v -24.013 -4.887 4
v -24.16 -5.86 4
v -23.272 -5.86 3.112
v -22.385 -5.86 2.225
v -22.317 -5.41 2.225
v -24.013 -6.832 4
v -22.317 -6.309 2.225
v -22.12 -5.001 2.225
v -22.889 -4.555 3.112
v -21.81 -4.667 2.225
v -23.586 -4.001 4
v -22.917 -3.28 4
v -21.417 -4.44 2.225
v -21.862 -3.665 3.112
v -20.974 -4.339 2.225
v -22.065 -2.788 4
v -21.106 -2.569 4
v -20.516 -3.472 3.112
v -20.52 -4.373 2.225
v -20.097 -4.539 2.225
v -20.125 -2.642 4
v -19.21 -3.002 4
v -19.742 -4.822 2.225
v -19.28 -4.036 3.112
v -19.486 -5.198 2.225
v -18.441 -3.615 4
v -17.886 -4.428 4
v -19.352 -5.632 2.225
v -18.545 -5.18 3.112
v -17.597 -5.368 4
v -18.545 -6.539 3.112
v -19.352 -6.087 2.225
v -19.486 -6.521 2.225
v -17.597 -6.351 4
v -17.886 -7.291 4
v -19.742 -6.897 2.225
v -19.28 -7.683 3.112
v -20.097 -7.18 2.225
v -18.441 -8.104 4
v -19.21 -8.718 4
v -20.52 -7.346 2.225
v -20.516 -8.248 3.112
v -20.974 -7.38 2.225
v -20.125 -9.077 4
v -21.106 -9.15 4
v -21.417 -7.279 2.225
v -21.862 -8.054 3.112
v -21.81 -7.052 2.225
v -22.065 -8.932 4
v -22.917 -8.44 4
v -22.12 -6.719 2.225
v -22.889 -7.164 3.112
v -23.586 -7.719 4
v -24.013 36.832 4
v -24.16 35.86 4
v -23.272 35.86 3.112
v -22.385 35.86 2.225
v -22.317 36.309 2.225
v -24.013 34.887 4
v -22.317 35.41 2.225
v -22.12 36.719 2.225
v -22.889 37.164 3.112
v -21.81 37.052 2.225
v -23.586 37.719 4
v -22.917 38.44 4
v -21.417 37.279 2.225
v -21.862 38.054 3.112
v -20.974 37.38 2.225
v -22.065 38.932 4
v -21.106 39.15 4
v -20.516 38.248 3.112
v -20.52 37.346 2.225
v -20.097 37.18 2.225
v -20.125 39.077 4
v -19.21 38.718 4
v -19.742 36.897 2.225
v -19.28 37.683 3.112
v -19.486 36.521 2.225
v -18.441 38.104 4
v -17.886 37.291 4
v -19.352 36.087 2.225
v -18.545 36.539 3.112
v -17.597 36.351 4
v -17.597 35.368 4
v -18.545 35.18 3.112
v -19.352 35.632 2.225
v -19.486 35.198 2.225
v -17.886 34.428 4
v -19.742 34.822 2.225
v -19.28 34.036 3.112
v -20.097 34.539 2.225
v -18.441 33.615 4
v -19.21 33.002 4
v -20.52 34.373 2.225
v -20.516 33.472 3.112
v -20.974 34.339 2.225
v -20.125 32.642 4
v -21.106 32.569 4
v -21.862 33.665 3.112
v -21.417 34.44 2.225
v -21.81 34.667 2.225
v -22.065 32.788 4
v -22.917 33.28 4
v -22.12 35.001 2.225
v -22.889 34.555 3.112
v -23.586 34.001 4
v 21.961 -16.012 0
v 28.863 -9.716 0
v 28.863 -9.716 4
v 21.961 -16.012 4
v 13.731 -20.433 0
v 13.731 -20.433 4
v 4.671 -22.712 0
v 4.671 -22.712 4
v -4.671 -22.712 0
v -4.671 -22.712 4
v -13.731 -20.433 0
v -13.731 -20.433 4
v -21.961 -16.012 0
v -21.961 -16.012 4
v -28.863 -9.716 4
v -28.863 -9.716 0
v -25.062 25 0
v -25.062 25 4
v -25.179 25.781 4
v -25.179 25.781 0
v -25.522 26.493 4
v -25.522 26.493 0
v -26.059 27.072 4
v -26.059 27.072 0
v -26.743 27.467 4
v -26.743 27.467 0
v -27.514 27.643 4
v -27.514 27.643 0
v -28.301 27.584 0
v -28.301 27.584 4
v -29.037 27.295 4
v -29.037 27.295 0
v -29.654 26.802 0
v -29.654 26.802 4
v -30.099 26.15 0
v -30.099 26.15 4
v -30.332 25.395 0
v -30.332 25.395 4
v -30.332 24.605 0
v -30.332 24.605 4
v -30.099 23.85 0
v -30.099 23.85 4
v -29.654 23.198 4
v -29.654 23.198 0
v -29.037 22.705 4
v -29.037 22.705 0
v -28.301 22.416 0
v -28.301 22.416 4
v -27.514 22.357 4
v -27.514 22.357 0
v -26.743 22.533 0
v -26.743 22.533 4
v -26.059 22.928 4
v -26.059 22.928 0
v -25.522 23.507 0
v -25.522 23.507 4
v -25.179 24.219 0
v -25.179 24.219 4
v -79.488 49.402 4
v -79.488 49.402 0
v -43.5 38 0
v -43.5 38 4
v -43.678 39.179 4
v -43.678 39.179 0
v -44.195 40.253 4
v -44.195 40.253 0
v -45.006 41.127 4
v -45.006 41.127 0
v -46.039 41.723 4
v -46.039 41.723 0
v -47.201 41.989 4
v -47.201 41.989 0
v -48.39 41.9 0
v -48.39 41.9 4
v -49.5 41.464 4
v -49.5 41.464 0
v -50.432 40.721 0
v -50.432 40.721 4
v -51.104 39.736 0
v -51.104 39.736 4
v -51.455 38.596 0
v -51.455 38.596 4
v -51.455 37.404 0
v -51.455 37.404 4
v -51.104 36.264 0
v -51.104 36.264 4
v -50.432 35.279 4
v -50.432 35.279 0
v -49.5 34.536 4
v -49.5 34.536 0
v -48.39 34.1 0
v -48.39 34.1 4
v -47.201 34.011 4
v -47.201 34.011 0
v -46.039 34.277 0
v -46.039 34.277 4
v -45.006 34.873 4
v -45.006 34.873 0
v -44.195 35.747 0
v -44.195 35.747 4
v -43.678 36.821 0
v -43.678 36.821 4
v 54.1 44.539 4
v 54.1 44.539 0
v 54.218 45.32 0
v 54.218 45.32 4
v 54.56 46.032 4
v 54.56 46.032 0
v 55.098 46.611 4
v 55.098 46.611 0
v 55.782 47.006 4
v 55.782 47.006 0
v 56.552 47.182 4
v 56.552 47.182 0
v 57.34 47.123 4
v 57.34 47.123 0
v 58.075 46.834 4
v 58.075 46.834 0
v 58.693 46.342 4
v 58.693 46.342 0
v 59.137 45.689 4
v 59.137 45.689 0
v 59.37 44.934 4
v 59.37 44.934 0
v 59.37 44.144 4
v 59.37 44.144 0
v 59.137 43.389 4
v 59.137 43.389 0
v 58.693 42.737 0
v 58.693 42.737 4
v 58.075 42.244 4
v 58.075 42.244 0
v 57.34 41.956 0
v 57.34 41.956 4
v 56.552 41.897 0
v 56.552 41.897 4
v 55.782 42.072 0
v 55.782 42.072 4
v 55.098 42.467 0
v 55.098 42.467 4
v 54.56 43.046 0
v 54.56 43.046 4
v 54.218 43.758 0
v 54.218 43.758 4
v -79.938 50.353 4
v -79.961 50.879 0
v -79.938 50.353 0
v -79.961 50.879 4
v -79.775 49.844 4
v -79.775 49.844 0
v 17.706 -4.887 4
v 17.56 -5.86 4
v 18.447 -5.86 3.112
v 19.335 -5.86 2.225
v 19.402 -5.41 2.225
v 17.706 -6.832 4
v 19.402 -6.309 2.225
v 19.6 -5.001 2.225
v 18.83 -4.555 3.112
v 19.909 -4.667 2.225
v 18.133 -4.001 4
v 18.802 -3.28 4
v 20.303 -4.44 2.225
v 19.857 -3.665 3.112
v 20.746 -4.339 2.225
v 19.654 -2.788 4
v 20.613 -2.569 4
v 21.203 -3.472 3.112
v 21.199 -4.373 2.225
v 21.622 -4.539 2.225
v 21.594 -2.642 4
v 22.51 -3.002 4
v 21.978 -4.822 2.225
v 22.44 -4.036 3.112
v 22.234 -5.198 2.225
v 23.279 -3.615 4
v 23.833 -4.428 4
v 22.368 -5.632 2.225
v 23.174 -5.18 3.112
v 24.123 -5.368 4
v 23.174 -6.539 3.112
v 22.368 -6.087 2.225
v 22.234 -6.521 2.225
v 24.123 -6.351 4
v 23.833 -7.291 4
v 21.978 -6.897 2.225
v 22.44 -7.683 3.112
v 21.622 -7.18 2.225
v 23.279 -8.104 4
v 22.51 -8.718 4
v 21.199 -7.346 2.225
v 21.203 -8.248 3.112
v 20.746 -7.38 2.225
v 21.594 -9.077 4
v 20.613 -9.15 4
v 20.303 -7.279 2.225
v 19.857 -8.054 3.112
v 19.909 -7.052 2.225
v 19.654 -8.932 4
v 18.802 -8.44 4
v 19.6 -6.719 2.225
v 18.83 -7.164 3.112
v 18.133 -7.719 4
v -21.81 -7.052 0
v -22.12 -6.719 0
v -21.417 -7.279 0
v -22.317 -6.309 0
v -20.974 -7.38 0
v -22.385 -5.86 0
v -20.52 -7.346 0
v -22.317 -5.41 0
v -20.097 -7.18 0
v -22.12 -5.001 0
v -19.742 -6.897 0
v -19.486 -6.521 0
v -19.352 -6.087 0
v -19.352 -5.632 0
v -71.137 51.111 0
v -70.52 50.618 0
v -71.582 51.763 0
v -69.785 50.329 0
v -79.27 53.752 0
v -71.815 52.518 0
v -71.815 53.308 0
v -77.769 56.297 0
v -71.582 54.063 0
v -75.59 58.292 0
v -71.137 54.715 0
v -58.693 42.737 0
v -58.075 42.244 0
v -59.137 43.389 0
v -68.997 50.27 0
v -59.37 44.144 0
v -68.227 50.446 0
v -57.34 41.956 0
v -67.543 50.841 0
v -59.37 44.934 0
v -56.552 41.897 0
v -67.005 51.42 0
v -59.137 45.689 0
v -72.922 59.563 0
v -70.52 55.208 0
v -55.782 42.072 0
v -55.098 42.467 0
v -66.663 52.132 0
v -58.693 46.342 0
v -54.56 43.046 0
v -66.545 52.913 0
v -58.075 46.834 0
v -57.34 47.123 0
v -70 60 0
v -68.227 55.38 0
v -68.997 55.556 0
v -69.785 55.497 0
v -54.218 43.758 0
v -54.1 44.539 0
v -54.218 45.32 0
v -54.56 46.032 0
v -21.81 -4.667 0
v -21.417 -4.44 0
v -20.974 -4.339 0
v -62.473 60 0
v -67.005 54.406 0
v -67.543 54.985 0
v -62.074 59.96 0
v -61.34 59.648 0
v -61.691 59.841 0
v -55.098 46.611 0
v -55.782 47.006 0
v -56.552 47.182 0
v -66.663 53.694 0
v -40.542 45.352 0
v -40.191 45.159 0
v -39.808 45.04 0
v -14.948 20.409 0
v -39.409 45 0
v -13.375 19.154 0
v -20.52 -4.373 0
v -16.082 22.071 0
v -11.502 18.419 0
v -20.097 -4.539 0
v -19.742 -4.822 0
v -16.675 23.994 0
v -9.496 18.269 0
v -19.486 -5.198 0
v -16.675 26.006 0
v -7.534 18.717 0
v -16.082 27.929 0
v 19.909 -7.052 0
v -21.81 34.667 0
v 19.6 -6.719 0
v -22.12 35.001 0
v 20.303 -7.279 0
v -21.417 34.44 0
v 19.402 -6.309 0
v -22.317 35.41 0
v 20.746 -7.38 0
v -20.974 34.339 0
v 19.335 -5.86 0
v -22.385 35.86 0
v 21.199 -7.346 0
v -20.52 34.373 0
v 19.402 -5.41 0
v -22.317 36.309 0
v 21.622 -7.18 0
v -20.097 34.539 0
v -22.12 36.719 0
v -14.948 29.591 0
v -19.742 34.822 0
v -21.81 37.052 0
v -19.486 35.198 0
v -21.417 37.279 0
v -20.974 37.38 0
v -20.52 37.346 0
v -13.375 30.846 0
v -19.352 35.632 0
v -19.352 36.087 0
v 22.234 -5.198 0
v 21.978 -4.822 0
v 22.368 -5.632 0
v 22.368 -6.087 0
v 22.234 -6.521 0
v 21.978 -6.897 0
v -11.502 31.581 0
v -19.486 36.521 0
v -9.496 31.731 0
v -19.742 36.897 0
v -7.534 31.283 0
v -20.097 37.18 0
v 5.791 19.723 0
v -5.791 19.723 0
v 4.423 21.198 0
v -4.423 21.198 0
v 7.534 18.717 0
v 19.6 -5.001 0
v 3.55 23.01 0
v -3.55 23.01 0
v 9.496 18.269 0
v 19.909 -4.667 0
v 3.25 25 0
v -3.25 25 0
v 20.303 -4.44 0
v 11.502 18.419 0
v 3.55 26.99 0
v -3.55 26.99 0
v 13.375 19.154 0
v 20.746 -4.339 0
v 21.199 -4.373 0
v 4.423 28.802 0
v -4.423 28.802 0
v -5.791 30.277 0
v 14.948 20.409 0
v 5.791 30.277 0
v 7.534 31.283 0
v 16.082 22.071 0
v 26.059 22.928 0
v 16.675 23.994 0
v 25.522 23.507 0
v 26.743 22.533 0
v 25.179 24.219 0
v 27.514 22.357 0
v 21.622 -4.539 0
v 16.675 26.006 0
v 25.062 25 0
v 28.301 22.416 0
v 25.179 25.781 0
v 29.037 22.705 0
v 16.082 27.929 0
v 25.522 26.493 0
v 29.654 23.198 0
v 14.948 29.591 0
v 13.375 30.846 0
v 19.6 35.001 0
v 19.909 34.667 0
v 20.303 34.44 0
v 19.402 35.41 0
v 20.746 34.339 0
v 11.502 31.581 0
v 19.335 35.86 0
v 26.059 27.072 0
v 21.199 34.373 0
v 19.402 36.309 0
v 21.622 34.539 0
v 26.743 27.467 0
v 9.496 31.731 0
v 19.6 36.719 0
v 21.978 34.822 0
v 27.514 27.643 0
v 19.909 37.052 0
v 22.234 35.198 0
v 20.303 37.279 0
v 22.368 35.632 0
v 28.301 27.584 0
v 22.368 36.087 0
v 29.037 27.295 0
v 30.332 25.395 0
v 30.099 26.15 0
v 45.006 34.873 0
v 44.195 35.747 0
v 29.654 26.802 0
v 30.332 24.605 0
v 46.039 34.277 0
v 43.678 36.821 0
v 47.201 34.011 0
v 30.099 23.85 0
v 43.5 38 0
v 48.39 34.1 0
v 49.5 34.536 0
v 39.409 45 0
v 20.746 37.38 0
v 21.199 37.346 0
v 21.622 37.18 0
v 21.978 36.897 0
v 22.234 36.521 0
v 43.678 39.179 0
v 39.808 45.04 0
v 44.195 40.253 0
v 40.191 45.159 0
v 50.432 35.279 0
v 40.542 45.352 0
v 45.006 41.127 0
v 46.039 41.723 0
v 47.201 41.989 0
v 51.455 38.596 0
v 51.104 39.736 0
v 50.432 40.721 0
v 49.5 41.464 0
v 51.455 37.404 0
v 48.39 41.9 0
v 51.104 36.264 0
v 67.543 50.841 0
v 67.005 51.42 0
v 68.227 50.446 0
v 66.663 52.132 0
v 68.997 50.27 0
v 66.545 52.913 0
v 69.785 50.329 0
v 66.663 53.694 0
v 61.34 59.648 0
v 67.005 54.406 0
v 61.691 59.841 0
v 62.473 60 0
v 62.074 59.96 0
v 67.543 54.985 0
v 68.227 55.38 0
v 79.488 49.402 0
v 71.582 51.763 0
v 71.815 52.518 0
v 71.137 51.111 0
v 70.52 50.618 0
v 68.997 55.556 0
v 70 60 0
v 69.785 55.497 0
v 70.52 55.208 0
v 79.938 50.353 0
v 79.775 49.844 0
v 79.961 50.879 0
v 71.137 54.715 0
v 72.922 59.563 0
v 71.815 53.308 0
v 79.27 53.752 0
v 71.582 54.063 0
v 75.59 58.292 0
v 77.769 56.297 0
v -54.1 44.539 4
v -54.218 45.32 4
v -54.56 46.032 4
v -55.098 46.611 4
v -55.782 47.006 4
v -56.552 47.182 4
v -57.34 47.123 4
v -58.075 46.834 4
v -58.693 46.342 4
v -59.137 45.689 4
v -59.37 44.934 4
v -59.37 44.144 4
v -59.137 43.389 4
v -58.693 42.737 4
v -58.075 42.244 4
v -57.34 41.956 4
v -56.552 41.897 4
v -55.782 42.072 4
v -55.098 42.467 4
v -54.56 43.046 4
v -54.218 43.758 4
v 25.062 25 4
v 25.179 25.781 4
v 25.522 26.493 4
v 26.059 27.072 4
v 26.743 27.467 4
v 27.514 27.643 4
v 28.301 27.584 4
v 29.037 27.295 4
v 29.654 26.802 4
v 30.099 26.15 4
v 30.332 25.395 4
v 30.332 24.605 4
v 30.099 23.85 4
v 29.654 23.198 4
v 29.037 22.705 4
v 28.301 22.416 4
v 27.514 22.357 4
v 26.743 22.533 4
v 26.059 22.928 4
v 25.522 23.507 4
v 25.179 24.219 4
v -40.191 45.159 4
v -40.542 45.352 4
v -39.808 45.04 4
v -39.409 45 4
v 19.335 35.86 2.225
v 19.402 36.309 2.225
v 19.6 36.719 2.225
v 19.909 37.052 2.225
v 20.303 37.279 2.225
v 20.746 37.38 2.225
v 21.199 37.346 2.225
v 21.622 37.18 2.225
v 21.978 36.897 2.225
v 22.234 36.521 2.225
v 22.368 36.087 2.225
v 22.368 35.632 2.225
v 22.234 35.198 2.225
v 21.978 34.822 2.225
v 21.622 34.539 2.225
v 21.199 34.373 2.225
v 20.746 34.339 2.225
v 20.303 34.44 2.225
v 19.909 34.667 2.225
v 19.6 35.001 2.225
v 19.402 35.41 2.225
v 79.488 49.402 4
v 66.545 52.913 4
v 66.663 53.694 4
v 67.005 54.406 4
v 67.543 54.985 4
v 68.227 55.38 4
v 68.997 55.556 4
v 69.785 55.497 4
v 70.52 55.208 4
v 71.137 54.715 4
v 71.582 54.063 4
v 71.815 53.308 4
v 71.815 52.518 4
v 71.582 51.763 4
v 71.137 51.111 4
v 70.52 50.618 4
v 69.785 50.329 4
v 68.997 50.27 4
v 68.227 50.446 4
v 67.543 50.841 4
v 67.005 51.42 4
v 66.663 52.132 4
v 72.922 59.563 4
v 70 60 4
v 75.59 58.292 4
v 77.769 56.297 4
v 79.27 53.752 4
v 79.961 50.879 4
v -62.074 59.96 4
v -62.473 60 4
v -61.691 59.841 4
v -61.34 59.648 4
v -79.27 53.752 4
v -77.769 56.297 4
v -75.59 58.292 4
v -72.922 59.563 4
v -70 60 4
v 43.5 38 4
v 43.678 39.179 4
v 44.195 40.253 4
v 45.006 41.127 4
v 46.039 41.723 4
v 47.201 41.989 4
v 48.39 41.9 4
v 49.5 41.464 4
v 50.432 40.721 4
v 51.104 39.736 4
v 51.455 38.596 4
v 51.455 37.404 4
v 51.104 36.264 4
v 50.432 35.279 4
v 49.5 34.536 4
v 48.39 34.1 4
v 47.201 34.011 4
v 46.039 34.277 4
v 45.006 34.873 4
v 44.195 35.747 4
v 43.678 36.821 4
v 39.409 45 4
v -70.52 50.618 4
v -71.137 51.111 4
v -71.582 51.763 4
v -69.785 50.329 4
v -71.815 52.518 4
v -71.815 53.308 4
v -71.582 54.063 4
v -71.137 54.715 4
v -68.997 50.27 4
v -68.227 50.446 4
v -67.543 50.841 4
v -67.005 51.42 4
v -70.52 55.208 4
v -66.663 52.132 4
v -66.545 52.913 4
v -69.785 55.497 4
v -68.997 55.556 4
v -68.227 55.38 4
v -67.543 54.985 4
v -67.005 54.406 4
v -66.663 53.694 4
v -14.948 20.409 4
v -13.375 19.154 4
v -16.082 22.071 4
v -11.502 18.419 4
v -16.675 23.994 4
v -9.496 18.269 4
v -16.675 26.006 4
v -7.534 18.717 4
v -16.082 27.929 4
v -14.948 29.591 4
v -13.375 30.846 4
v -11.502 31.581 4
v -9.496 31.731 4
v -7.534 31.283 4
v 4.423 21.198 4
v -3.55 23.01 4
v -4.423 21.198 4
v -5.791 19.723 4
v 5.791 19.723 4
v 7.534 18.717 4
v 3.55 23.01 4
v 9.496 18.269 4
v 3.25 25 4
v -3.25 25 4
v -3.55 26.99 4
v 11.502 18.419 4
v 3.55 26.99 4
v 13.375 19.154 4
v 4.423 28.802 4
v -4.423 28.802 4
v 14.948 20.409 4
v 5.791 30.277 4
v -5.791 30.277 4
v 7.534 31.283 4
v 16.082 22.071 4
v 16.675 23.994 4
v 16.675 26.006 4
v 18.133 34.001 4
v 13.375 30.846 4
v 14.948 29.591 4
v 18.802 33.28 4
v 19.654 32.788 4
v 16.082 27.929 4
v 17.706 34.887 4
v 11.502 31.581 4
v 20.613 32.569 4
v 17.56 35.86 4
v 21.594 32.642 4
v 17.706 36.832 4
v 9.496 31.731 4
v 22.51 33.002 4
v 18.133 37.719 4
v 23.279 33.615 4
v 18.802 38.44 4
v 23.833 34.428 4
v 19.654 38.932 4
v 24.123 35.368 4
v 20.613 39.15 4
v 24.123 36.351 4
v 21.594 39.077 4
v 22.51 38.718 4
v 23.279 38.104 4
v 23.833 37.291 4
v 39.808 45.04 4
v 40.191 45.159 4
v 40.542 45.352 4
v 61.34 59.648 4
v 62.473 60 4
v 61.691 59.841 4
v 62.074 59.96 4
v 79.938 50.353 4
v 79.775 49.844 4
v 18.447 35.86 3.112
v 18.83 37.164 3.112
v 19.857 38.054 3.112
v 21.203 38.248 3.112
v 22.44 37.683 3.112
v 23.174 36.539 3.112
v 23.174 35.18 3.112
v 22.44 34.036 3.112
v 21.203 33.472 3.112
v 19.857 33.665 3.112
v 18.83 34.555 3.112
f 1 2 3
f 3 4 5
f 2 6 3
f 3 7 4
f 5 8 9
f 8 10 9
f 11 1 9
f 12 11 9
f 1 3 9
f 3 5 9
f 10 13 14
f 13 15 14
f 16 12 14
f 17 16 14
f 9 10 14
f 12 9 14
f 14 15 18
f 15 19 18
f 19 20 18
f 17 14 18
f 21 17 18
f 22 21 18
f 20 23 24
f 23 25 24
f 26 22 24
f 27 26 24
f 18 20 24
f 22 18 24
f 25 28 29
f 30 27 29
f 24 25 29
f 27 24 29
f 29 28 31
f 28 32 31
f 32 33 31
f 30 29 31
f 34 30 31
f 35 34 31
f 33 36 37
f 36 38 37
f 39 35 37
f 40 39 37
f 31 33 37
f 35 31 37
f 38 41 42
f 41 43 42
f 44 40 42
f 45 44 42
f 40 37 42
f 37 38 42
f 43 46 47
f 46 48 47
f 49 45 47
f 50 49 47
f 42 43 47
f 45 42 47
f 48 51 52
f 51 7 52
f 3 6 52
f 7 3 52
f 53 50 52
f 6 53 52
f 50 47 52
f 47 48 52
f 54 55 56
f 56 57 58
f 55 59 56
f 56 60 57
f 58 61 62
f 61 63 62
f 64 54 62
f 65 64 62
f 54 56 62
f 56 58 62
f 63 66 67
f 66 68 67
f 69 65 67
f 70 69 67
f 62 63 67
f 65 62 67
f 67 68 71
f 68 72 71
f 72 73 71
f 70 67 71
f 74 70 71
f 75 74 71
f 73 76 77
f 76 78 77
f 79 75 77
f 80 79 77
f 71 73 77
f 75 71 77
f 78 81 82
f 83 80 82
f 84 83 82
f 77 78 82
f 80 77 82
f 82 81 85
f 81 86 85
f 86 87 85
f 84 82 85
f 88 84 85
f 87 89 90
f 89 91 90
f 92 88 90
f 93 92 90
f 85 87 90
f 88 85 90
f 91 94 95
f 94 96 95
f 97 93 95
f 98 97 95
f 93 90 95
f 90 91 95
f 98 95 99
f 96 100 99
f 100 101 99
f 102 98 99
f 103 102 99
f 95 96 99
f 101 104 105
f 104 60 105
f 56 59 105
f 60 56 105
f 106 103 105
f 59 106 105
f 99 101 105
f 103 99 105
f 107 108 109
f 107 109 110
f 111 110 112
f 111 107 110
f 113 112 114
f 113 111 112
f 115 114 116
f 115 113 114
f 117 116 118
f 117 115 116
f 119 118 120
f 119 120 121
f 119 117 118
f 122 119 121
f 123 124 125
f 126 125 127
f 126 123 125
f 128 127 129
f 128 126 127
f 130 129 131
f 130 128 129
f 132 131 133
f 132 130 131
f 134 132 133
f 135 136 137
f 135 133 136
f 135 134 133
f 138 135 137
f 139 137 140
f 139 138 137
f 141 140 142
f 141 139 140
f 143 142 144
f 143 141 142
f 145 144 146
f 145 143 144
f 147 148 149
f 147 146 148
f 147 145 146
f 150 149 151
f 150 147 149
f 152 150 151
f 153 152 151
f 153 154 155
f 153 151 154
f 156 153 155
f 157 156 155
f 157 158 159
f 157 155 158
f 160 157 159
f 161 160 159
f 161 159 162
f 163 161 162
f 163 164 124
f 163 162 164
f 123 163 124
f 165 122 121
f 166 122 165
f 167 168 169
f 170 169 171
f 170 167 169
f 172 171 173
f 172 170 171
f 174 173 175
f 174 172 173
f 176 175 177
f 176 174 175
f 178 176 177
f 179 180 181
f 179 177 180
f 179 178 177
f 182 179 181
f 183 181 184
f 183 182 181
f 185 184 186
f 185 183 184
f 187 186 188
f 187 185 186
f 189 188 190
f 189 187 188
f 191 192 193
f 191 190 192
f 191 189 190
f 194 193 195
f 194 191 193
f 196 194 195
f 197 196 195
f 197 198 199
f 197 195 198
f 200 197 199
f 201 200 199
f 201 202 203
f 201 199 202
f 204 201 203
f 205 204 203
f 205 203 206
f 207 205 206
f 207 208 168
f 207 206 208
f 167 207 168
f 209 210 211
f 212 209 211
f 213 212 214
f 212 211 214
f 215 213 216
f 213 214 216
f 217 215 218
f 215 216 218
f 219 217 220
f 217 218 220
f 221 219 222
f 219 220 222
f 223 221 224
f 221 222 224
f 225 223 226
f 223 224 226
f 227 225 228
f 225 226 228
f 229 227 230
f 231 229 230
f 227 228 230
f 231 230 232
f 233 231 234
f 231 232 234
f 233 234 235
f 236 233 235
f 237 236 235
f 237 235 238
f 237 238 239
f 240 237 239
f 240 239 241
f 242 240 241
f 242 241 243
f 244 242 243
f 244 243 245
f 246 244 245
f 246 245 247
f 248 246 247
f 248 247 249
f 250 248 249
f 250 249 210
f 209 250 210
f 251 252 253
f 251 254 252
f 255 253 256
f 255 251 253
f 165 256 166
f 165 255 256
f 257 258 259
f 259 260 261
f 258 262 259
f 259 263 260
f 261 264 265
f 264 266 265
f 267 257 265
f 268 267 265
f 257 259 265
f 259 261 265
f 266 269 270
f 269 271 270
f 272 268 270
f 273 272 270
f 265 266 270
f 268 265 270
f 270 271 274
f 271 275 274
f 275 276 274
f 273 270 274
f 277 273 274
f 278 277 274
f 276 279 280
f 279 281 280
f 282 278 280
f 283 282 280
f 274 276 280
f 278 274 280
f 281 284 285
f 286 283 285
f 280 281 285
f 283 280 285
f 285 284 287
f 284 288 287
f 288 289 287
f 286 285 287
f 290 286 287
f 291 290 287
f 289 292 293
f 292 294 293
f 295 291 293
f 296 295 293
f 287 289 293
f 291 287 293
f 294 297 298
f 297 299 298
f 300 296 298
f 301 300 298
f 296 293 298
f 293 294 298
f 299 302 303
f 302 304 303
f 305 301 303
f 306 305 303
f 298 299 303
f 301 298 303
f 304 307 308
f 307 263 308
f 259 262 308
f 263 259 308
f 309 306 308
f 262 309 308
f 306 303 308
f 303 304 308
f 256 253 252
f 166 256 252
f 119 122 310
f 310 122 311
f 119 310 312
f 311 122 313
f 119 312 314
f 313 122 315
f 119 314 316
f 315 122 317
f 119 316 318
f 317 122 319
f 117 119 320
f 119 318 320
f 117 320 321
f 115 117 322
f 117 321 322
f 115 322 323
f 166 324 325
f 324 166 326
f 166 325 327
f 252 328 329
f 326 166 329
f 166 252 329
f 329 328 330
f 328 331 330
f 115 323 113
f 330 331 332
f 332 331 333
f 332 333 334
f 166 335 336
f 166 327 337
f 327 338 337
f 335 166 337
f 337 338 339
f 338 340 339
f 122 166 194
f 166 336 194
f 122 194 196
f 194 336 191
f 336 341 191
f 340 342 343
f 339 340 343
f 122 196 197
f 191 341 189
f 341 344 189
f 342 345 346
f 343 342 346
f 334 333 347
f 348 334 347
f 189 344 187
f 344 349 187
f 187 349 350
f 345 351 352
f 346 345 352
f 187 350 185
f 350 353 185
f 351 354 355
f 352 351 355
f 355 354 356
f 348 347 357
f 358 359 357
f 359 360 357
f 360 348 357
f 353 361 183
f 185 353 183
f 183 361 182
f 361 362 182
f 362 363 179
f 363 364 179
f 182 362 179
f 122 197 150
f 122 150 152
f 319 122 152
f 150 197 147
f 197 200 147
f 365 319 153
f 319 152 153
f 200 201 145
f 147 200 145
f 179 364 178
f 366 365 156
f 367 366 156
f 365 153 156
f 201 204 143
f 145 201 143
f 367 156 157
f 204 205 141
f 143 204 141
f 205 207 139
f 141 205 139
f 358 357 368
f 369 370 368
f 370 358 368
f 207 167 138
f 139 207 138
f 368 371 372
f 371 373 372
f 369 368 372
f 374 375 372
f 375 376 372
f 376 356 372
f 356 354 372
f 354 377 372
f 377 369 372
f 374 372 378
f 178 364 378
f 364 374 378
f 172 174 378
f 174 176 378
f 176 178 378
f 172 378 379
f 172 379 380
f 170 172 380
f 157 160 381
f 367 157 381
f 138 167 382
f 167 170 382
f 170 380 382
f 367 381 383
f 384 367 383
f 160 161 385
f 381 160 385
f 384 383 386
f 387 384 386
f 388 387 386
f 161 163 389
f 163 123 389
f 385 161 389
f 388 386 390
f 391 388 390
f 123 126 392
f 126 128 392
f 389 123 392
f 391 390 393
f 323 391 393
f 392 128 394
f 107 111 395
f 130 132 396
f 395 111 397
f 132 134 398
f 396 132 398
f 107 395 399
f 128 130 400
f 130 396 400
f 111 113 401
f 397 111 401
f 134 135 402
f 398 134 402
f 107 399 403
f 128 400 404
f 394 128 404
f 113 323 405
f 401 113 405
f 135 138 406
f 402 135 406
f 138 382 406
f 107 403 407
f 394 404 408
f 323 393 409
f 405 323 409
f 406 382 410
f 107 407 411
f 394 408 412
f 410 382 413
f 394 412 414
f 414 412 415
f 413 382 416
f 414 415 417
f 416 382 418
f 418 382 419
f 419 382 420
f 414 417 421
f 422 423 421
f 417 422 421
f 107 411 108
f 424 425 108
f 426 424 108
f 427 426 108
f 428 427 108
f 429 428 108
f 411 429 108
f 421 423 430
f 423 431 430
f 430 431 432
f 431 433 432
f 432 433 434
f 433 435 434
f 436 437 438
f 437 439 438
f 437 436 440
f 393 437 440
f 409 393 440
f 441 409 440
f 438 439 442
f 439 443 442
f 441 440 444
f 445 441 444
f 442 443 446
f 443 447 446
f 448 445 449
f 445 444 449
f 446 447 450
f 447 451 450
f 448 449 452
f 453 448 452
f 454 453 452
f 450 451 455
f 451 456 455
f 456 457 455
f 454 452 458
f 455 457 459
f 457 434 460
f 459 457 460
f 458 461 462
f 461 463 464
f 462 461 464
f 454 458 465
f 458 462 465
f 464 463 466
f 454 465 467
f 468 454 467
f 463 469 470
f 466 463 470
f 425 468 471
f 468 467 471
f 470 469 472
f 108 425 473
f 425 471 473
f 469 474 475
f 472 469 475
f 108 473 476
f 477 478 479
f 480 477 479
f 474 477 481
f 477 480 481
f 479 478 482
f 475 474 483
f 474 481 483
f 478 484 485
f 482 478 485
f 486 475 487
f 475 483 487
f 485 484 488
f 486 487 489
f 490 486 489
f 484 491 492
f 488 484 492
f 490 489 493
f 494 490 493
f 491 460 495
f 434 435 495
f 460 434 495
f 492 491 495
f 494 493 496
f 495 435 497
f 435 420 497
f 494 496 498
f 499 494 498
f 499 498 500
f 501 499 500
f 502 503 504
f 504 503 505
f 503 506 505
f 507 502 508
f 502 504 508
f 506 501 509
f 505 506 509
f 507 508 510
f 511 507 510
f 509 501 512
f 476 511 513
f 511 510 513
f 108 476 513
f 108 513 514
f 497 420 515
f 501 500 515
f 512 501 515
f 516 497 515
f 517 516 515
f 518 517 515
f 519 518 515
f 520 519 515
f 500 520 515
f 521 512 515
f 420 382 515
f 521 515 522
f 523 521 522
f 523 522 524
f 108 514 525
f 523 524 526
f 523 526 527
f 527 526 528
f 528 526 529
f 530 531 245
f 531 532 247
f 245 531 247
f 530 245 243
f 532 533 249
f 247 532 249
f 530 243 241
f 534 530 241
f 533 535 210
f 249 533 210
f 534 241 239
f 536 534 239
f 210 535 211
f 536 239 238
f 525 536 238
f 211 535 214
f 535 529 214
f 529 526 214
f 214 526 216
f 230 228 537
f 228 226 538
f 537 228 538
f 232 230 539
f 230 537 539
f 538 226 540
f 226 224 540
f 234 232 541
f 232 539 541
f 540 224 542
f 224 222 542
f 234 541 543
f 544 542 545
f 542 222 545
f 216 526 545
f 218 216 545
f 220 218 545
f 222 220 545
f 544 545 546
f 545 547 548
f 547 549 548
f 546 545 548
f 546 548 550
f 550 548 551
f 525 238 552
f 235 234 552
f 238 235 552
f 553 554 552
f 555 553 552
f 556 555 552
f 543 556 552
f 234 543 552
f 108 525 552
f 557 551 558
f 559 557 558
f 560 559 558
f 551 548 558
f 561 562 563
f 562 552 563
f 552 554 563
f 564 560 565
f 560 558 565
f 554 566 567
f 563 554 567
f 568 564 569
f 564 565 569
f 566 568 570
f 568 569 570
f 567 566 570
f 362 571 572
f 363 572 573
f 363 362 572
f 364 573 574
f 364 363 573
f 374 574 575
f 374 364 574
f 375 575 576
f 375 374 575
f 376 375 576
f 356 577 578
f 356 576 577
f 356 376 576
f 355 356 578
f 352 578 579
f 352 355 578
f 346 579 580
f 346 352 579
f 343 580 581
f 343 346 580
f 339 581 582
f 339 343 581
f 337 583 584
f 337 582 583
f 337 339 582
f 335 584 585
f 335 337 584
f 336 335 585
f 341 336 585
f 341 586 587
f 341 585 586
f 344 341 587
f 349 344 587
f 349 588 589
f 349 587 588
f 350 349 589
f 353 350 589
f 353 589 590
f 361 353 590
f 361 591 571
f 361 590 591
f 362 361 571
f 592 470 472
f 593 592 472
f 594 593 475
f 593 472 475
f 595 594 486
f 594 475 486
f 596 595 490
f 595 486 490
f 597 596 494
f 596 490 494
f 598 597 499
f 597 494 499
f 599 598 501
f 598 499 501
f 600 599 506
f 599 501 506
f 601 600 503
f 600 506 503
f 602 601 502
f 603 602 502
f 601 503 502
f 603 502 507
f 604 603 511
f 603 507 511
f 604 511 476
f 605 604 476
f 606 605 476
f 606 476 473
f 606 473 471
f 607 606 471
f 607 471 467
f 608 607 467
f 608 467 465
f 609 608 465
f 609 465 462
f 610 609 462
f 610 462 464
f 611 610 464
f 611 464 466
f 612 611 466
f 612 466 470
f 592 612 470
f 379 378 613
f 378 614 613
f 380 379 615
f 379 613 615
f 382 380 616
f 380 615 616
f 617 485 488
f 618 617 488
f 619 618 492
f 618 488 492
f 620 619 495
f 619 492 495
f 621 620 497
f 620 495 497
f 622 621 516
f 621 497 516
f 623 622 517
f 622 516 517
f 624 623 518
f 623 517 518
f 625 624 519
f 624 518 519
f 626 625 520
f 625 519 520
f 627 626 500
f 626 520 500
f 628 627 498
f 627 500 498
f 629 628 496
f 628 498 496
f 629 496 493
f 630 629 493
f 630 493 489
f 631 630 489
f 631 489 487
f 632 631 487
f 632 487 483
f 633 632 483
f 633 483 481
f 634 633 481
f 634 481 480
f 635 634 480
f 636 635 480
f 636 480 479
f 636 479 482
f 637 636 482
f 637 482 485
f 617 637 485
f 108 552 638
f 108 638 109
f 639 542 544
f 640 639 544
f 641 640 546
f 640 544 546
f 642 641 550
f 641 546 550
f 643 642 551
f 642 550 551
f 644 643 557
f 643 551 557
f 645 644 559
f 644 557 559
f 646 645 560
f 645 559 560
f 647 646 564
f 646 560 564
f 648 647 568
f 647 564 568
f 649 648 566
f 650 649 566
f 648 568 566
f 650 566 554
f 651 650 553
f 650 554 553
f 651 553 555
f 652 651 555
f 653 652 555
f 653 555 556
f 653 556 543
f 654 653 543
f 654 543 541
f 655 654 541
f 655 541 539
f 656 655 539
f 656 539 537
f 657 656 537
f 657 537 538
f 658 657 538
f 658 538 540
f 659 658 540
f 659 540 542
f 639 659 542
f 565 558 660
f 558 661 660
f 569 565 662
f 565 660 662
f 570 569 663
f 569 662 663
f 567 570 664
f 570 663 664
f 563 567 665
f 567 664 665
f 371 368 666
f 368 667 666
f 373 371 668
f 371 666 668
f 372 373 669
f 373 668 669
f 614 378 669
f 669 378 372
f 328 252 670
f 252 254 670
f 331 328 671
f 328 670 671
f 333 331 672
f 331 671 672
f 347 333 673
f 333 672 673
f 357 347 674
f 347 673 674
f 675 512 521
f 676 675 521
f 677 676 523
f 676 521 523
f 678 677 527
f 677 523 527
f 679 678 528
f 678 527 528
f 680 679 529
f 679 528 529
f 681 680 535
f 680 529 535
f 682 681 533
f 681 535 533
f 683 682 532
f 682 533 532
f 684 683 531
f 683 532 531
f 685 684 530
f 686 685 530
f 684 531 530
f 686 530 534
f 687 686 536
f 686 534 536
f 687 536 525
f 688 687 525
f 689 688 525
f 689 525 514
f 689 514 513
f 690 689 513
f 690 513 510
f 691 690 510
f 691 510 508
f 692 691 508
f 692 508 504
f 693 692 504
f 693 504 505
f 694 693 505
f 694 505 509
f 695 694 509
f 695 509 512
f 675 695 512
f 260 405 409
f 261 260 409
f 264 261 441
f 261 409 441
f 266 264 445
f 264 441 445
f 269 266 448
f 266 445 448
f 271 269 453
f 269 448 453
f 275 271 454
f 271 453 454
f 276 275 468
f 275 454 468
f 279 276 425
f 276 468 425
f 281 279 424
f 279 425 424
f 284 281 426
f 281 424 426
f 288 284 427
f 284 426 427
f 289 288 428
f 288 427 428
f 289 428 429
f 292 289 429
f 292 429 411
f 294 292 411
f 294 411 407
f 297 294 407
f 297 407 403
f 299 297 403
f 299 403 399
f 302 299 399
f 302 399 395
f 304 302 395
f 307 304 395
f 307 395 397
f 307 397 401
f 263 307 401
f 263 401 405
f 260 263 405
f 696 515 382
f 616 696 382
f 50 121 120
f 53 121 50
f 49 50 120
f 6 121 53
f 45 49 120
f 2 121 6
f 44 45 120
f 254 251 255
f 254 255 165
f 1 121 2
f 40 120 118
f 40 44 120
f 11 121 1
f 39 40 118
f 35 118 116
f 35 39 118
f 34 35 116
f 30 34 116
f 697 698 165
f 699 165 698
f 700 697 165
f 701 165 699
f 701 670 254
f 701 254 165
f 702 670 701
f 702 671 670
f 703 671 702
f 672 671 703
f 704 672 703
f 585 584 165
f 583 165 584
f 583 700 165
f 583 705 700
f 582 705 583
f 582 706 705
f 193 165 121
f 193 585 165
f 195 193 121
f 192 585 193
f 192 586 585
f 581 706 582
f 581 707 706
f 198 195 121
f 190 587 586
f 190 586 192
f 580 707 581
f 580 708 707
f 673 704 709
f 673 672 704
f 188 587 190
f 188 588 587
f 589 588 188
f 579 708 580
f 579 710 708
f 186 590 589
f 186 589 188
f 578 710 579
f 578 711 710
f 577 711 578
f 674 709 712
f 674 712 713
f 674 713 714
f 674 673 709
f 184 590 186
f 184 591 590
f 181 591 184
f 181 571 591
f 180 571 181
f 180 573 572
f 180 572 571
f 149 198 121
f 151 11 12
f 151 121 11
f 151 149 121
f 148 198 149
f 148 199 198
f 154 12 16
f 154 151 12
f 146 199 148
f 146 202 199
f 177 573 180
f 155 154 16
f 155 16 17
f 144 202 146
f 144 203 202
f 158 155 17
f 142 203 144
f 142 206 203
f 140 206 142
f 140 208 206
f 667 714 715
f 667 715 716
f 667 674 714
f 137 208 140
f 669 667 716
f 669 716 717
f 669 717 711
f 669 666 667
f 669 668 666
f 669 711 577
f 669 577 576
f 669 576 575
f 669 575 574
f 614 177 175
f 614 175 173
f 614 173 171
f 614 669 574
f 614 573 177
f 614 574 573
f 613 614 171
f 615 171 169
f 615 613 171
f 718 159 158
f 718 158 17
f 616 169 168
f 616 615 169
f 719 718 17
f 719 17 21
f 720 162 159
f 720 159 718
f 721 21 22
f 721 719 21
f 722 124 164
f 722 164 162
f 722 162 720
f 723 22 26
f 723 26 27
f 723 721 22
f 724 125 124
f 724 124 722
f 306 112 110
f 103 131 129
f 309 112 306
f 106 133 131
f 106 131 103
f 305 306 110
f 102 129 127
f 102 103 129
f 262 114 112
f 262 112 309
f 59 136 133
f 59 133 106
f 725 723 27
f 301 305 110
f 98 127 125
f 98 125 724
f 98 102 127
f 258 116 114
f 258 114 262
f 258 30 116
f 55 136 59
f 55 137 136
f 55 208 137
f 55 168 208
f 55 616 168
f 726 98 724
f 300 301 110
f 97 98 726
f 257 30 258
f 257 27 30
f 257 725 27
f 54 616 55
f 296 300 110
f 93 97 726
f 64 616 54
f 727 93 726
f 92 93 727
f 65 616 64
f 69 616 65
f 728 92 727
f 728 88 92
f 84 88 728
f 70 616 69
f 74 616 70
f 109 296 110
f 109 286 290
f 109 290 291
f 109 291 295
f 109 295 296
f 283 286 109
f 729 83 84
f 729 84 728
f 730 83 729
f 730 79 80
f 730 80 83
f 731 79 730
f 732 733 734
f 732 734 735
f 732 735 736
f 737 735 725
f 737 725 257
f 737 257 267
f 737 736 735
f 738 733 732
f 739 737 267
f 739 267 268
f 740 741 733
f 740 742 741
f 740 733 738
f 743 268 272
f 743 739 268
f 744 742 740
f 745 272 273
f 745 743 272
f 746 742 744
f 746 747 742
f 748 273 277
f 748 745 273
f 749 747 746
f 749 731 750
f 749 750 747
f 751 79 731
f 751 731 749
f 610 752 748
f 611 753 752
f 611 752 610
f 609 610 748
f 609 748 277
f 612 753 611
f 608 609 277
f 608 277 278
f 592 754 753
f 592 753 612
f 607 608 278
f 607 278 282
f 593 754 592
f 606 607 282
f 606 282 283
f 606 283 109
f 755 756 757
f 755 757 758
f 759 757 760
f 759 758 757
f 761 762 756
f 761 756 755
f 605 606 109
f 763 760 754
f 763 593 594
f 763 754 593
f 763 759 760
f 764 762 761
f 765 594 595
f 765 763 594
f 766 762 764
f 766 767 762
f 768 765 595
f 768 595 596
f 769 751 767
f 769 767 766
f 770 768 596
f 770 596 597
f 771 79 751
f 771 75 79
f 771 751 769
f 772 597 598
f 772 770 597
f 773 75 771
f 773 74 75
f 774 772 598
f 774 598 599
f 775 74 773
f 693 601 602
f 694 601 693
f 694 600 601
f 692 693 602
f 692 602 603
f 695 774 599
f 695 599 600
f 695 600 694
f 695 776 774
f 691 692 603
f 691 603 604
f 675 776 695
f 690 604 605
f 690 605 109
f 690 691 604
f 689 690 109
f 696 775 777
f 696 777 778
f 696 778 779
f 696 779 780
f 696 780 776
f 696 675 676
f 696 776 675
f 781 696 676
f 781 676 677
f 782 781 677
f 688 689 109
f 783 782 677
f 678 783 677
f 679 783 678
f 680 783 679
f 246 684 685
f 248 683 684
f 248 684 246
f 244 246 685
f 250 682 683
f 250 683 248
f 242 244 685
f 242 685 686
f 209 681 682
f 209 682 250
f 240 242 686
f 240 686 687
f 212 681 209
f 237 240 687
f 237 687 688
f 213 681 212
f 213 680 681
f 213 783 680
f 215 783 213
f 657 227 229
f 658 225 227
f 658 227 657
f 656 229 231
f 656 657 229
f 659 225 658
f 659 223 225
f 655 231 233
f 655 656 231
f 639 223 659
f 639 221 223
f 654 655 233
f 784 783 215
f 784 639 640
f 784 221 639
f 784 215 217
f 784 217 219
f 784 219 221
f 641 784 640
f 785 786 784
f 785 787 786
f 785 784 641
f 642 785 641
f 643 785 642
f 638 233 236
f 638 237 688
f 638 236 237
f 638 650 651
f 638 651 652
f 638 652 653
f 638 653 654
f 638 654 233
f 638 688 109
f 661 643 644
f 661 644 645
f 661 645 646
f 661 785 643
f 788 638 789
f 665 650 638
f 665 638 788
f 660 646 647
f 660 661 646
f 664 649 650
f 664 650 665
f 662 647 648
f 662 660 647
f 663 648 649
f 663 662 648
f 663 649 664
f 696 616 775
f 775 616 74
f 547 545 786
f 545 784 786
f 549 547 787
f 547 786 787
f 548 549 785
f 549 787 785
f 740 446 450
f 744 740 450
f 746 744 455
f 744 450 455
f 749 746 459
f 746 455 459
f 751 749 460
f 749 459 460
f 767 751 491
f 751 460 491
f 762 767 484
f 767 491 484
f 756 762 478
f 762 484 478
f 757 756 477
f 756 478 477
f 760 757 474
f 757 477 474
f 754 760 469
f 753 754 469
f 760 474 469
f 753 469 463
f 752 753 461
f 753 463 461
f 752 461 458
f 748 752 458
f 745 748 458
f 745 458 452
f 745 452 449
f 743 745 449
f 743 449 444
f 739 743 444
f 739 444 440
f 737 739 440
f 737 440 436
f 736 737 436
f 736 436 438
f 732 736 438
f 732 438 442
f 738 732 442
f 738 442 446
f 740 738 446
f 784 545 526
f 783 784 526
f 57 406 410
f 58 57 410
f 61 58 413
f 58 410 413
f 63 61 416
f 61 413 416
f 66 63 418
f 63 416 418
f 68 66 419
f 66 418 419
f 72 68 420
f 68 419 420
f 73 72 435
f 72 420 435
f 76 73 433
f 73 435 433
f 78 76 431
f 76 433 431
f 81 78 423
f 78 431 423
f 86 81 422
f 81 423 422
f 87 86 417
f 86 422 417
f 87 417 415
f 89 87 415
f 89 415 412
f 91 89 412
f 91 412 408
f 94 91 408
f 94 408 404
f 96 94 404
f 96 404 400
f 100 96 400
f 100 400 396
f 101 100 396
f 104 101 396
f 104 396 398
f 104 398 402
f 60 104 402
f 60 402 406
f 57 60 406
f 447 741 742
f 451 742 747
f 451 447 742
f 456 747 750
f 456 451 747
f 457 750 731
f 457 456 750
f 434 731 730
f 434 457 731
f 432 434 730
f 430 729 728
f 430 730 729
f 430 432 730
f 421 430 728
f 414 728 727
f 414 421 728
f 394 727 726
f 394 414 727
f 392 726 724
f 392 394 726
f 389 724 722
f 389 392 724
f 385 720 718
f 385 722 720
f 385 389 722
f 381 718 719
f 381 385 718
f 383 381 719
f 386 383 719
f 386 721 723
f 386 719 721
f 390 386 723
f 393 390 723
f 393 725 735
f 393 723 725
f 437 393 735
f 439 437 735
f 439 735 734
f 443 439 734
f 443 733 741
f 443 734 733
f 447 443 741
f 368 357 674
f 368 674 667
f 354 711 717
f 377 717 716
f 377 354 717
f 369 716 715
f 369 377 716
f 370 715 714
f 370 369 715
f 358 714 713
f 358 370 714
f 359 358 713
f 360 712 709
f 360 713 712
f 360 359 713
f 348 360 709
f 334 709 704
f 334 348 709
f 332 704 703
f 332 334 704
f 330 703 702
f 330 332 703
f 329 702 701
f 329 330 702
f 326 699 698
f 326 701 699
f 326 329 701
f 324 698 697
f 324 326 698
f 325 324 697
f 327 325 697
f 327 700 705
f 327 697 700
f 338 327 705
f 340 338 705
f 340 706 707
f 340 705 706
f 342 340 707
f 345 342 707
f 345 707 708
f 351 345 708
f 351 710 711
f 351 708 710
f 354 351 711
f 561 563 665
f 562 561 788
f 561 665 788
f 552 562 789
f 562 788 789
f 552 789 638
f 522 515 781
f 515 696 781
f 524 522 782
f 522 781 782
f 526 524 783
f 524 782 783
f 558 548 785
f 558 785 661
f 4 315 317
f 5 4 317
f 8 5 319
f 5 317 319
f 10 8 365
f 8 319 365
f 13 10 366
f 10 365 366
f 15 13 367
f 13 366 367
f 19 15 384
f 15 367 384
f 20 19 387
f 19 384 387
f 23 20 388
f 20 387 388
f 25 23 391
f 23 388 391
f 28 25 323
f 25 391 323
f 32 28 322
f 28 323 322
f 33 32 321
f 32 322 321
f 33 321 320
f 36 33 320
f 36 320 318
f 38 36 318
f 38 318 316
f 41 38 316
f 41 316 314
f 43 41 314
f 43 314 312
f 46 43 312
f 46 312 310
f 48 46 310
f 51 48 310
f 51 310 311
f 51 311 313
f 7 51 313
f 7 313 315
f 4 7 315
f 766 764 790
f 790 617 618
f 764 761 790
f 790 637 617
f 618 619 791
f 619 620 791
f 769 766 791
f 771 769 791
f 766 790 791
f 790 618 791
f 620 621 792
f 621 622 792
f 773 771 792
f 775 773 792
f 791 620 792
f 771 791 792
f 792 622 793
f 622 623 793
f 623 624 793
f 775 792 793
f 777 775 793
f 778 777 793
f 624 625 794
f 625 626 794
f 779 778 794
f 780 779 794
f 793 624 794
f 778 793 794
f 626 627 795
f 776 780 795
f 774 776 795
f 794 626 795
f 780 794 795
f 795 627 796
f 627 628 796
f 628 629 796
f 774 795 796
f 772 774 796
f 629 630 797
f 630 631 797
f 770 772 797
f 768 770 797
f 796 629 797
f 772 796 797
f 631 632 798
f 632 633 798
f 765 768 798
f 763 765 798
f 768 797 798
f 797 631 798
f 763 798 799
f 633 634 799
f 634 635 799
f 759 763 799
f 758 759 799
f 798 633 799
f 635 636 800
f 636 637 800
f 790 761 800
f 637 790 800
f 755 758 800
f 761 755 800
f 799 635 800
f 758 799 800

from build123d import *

# Parameters (mm, degrees)
SKETCH_1_W                   = 160
SKETCH_1_H                   = 120
EXTRUDE_1_DEPTH              = 4
SKETCH_2_R                   = 4
SKETCH_2_R_2                 = 2.65
SKETCH_2_R_3                 = 6.75
CUT_EXTRUDE_1_DEPTH          = 24
CUT_EXTRUDE_2_DEPTH          = 54
SKETCH_5_R                   = 1.525
CUT_EXTRUDE_3_DEPTH          = 54
CUT_EXTRUDE_4_DEPTH          = 84
FILLET_1_R                   = 10
HOLE_WIZARD_M3_1_D           = 3.05
HOLE_WIZARD_M3_1_DEPTH       = 7.5
HOLE_WIZARD_M3_1_CSINK_D     = 6.6
HOLE_WIZARD_M3_1_CSINK_ANGLE = 90
HOLE_WIZARD_M3_1_TIP         = 0.916312444
FILLET_2_R                   = 2


with BuildPart() as part:
    # 草图1 → 凸台-拉伸1 (new body)
    with BuildSketch(Plane.XY):
        Rectangle(SKETCH_1_W, SKETCH_1_H)
    extrude(amount=EXTRUDE_1_DEPTH)

    # 草图2 → 切除-拉伸1 (cut)
    with BuildSketch(Plane(origin=(0, 0, 0), x_dir=(-1, 0, 0), z_dir=(0, 0, -1))):
        with Locations((-47.5, 38)):
            Circle(SKETCH_2_R)
        with Locations((-56.749921469, 44.53912734)):
            Circle(SKETCH_2_R_2)
        with Locations((-69.194904497, 52.913039057)):
            Circle(SKETCH_2_R_2)
        with Locations((-27.711627738, 25)):
            Circle(SKETCH_2_R_2)
        with Locations((-10, 25)):
            Circle(SKETCH_2_R_3)
    cut_extrude_1 = extrude(amount=-CUT_EXTRUDE_1_DEPTH, mode=Mode.SUBTRACT)

    # 镜向1: 切除-拉伸1 across plane
    add(cut_extrude_1.mirror(Plane(origin=(0, 0, 0), x_dir=(0, 0, 1), z_dir=(1, 0, 0))), mode=Mode.SUBTRACT)

    # 草图3 → 切除-拉伸2 (cut)
    with BuildSketch(Plane(origin=(0, 0, 0), x_dir=(-1, 0, 0), z_dir=(0, 0, -1))):
        Polygon((-61.851610318, 60), (-40.030198451, 45), (40.030198451, 45), (61.851610318, 60), align=None)
    extrude(amount=-CUT_EXTRUDE_2_DEPTH, mode=Mode.SUBTRACT)

    # 草图5 → 切除-拉伸3 (cut)
    with BuildSketch(Plane(origin=(0, 0, 0), x_dir=(-1, 0, 0), z_dir=(0, 0, -1))):
        with Locations((-20.859650045, 35.859650045)):
            Circle(SKETCH_5_R)
        with Locations((-20.859650045, -5.859650045)):
            Circle(SKETCH_5_R)
        with Locations((20.859650045, -5.859650045)):
            Circle(SKETCH_5_R)
        with Locations((20.859650045, 35.859650045)):
            Circle(SKETCH_5_R)
    extrude(amount=-CUT_EXTRUDE_3_DEPTH, mode=Mode.SUBTRACT)

    # 草图6 → 切除-拉伸4 (cut)
    with BuildSketch(Plane(origin=(0, 0, 0), x_dir=(-1, 0, 0), z_dir=(0, 0, -1))):
        with BuildLine():
            Line((-80, 50), (-28.863438287, -9.71643037))
            ThreePointArc((-28.863438287, -9.71643037), (0, -23), (28.863438287, -9.71643037))
            Line((28.863438287, -9.71643037), (80, 50))
            Line((80, 50), (80, -60))
            Line((80, -60), (-80, -60))
            Line((-80, -60), (-80, 50))
        make_face()
    extrude(amount=-CUT_EXTRUDE_4_DEPTH, mode=Mode.SUBTRACT)

    # 圆角1
    fillet_1_edges = [part.edges().sort_by_distance(p)[0] for p in [
        (-80, 60, 2),
        (80, 60, 2),
    ]]
    fillet(fillet_1_edges, radius=FILLET_1_R - 0.0001)  # a hair under: the kernel refuses the full size

    # M3 十字槽半沉头木螺钉的锥形沉头孔1
    with Locations(Plane.XY.offset(4)):
        with Locations((-20.859650045, 35.859650045), (20.859650045, 35.859650045), (20.859650045, -5.859650045), (-20.859650045, -5.859650045)):
            CounterSinkHole(HOLE_WIZARD_M3_1_D / 2, HOLE_WIZARD_M3_1_CSINK_D / 2, depth=HOLE_WIZARD_M3_1_DEPTH, counter_sink_angle=HOLE_WIZARD_M3_1_CSINK_ANGLE)
            with Locations((0, 0, -(HOLE_WIZARD_M3_1_DEPTH + HOLE_WIZARD_M3_1_TIP / 2))):  # 118° drill point
                Cone(0, HOLE_WIZARD_M3_1_D / 2, HOLE_WIZARD_M3_1_TIP, mode=Mode.SUBTRACT)

    # 圆角2
    fillet_2_edges = [part.edges().sort_by_distance(p)[0] for p in [
        (80, 50, 2),
        (-80, 50, 2),
        (61.851610318, 60, 2),
        (-61.851610318, 60, 2),
        (-40.030198451, 45, 2),
        (40.030198451, 45, 2),
    ]]
    fillet(fillet_2_edges, radius=FILLET_2_R)


solid = part.part
